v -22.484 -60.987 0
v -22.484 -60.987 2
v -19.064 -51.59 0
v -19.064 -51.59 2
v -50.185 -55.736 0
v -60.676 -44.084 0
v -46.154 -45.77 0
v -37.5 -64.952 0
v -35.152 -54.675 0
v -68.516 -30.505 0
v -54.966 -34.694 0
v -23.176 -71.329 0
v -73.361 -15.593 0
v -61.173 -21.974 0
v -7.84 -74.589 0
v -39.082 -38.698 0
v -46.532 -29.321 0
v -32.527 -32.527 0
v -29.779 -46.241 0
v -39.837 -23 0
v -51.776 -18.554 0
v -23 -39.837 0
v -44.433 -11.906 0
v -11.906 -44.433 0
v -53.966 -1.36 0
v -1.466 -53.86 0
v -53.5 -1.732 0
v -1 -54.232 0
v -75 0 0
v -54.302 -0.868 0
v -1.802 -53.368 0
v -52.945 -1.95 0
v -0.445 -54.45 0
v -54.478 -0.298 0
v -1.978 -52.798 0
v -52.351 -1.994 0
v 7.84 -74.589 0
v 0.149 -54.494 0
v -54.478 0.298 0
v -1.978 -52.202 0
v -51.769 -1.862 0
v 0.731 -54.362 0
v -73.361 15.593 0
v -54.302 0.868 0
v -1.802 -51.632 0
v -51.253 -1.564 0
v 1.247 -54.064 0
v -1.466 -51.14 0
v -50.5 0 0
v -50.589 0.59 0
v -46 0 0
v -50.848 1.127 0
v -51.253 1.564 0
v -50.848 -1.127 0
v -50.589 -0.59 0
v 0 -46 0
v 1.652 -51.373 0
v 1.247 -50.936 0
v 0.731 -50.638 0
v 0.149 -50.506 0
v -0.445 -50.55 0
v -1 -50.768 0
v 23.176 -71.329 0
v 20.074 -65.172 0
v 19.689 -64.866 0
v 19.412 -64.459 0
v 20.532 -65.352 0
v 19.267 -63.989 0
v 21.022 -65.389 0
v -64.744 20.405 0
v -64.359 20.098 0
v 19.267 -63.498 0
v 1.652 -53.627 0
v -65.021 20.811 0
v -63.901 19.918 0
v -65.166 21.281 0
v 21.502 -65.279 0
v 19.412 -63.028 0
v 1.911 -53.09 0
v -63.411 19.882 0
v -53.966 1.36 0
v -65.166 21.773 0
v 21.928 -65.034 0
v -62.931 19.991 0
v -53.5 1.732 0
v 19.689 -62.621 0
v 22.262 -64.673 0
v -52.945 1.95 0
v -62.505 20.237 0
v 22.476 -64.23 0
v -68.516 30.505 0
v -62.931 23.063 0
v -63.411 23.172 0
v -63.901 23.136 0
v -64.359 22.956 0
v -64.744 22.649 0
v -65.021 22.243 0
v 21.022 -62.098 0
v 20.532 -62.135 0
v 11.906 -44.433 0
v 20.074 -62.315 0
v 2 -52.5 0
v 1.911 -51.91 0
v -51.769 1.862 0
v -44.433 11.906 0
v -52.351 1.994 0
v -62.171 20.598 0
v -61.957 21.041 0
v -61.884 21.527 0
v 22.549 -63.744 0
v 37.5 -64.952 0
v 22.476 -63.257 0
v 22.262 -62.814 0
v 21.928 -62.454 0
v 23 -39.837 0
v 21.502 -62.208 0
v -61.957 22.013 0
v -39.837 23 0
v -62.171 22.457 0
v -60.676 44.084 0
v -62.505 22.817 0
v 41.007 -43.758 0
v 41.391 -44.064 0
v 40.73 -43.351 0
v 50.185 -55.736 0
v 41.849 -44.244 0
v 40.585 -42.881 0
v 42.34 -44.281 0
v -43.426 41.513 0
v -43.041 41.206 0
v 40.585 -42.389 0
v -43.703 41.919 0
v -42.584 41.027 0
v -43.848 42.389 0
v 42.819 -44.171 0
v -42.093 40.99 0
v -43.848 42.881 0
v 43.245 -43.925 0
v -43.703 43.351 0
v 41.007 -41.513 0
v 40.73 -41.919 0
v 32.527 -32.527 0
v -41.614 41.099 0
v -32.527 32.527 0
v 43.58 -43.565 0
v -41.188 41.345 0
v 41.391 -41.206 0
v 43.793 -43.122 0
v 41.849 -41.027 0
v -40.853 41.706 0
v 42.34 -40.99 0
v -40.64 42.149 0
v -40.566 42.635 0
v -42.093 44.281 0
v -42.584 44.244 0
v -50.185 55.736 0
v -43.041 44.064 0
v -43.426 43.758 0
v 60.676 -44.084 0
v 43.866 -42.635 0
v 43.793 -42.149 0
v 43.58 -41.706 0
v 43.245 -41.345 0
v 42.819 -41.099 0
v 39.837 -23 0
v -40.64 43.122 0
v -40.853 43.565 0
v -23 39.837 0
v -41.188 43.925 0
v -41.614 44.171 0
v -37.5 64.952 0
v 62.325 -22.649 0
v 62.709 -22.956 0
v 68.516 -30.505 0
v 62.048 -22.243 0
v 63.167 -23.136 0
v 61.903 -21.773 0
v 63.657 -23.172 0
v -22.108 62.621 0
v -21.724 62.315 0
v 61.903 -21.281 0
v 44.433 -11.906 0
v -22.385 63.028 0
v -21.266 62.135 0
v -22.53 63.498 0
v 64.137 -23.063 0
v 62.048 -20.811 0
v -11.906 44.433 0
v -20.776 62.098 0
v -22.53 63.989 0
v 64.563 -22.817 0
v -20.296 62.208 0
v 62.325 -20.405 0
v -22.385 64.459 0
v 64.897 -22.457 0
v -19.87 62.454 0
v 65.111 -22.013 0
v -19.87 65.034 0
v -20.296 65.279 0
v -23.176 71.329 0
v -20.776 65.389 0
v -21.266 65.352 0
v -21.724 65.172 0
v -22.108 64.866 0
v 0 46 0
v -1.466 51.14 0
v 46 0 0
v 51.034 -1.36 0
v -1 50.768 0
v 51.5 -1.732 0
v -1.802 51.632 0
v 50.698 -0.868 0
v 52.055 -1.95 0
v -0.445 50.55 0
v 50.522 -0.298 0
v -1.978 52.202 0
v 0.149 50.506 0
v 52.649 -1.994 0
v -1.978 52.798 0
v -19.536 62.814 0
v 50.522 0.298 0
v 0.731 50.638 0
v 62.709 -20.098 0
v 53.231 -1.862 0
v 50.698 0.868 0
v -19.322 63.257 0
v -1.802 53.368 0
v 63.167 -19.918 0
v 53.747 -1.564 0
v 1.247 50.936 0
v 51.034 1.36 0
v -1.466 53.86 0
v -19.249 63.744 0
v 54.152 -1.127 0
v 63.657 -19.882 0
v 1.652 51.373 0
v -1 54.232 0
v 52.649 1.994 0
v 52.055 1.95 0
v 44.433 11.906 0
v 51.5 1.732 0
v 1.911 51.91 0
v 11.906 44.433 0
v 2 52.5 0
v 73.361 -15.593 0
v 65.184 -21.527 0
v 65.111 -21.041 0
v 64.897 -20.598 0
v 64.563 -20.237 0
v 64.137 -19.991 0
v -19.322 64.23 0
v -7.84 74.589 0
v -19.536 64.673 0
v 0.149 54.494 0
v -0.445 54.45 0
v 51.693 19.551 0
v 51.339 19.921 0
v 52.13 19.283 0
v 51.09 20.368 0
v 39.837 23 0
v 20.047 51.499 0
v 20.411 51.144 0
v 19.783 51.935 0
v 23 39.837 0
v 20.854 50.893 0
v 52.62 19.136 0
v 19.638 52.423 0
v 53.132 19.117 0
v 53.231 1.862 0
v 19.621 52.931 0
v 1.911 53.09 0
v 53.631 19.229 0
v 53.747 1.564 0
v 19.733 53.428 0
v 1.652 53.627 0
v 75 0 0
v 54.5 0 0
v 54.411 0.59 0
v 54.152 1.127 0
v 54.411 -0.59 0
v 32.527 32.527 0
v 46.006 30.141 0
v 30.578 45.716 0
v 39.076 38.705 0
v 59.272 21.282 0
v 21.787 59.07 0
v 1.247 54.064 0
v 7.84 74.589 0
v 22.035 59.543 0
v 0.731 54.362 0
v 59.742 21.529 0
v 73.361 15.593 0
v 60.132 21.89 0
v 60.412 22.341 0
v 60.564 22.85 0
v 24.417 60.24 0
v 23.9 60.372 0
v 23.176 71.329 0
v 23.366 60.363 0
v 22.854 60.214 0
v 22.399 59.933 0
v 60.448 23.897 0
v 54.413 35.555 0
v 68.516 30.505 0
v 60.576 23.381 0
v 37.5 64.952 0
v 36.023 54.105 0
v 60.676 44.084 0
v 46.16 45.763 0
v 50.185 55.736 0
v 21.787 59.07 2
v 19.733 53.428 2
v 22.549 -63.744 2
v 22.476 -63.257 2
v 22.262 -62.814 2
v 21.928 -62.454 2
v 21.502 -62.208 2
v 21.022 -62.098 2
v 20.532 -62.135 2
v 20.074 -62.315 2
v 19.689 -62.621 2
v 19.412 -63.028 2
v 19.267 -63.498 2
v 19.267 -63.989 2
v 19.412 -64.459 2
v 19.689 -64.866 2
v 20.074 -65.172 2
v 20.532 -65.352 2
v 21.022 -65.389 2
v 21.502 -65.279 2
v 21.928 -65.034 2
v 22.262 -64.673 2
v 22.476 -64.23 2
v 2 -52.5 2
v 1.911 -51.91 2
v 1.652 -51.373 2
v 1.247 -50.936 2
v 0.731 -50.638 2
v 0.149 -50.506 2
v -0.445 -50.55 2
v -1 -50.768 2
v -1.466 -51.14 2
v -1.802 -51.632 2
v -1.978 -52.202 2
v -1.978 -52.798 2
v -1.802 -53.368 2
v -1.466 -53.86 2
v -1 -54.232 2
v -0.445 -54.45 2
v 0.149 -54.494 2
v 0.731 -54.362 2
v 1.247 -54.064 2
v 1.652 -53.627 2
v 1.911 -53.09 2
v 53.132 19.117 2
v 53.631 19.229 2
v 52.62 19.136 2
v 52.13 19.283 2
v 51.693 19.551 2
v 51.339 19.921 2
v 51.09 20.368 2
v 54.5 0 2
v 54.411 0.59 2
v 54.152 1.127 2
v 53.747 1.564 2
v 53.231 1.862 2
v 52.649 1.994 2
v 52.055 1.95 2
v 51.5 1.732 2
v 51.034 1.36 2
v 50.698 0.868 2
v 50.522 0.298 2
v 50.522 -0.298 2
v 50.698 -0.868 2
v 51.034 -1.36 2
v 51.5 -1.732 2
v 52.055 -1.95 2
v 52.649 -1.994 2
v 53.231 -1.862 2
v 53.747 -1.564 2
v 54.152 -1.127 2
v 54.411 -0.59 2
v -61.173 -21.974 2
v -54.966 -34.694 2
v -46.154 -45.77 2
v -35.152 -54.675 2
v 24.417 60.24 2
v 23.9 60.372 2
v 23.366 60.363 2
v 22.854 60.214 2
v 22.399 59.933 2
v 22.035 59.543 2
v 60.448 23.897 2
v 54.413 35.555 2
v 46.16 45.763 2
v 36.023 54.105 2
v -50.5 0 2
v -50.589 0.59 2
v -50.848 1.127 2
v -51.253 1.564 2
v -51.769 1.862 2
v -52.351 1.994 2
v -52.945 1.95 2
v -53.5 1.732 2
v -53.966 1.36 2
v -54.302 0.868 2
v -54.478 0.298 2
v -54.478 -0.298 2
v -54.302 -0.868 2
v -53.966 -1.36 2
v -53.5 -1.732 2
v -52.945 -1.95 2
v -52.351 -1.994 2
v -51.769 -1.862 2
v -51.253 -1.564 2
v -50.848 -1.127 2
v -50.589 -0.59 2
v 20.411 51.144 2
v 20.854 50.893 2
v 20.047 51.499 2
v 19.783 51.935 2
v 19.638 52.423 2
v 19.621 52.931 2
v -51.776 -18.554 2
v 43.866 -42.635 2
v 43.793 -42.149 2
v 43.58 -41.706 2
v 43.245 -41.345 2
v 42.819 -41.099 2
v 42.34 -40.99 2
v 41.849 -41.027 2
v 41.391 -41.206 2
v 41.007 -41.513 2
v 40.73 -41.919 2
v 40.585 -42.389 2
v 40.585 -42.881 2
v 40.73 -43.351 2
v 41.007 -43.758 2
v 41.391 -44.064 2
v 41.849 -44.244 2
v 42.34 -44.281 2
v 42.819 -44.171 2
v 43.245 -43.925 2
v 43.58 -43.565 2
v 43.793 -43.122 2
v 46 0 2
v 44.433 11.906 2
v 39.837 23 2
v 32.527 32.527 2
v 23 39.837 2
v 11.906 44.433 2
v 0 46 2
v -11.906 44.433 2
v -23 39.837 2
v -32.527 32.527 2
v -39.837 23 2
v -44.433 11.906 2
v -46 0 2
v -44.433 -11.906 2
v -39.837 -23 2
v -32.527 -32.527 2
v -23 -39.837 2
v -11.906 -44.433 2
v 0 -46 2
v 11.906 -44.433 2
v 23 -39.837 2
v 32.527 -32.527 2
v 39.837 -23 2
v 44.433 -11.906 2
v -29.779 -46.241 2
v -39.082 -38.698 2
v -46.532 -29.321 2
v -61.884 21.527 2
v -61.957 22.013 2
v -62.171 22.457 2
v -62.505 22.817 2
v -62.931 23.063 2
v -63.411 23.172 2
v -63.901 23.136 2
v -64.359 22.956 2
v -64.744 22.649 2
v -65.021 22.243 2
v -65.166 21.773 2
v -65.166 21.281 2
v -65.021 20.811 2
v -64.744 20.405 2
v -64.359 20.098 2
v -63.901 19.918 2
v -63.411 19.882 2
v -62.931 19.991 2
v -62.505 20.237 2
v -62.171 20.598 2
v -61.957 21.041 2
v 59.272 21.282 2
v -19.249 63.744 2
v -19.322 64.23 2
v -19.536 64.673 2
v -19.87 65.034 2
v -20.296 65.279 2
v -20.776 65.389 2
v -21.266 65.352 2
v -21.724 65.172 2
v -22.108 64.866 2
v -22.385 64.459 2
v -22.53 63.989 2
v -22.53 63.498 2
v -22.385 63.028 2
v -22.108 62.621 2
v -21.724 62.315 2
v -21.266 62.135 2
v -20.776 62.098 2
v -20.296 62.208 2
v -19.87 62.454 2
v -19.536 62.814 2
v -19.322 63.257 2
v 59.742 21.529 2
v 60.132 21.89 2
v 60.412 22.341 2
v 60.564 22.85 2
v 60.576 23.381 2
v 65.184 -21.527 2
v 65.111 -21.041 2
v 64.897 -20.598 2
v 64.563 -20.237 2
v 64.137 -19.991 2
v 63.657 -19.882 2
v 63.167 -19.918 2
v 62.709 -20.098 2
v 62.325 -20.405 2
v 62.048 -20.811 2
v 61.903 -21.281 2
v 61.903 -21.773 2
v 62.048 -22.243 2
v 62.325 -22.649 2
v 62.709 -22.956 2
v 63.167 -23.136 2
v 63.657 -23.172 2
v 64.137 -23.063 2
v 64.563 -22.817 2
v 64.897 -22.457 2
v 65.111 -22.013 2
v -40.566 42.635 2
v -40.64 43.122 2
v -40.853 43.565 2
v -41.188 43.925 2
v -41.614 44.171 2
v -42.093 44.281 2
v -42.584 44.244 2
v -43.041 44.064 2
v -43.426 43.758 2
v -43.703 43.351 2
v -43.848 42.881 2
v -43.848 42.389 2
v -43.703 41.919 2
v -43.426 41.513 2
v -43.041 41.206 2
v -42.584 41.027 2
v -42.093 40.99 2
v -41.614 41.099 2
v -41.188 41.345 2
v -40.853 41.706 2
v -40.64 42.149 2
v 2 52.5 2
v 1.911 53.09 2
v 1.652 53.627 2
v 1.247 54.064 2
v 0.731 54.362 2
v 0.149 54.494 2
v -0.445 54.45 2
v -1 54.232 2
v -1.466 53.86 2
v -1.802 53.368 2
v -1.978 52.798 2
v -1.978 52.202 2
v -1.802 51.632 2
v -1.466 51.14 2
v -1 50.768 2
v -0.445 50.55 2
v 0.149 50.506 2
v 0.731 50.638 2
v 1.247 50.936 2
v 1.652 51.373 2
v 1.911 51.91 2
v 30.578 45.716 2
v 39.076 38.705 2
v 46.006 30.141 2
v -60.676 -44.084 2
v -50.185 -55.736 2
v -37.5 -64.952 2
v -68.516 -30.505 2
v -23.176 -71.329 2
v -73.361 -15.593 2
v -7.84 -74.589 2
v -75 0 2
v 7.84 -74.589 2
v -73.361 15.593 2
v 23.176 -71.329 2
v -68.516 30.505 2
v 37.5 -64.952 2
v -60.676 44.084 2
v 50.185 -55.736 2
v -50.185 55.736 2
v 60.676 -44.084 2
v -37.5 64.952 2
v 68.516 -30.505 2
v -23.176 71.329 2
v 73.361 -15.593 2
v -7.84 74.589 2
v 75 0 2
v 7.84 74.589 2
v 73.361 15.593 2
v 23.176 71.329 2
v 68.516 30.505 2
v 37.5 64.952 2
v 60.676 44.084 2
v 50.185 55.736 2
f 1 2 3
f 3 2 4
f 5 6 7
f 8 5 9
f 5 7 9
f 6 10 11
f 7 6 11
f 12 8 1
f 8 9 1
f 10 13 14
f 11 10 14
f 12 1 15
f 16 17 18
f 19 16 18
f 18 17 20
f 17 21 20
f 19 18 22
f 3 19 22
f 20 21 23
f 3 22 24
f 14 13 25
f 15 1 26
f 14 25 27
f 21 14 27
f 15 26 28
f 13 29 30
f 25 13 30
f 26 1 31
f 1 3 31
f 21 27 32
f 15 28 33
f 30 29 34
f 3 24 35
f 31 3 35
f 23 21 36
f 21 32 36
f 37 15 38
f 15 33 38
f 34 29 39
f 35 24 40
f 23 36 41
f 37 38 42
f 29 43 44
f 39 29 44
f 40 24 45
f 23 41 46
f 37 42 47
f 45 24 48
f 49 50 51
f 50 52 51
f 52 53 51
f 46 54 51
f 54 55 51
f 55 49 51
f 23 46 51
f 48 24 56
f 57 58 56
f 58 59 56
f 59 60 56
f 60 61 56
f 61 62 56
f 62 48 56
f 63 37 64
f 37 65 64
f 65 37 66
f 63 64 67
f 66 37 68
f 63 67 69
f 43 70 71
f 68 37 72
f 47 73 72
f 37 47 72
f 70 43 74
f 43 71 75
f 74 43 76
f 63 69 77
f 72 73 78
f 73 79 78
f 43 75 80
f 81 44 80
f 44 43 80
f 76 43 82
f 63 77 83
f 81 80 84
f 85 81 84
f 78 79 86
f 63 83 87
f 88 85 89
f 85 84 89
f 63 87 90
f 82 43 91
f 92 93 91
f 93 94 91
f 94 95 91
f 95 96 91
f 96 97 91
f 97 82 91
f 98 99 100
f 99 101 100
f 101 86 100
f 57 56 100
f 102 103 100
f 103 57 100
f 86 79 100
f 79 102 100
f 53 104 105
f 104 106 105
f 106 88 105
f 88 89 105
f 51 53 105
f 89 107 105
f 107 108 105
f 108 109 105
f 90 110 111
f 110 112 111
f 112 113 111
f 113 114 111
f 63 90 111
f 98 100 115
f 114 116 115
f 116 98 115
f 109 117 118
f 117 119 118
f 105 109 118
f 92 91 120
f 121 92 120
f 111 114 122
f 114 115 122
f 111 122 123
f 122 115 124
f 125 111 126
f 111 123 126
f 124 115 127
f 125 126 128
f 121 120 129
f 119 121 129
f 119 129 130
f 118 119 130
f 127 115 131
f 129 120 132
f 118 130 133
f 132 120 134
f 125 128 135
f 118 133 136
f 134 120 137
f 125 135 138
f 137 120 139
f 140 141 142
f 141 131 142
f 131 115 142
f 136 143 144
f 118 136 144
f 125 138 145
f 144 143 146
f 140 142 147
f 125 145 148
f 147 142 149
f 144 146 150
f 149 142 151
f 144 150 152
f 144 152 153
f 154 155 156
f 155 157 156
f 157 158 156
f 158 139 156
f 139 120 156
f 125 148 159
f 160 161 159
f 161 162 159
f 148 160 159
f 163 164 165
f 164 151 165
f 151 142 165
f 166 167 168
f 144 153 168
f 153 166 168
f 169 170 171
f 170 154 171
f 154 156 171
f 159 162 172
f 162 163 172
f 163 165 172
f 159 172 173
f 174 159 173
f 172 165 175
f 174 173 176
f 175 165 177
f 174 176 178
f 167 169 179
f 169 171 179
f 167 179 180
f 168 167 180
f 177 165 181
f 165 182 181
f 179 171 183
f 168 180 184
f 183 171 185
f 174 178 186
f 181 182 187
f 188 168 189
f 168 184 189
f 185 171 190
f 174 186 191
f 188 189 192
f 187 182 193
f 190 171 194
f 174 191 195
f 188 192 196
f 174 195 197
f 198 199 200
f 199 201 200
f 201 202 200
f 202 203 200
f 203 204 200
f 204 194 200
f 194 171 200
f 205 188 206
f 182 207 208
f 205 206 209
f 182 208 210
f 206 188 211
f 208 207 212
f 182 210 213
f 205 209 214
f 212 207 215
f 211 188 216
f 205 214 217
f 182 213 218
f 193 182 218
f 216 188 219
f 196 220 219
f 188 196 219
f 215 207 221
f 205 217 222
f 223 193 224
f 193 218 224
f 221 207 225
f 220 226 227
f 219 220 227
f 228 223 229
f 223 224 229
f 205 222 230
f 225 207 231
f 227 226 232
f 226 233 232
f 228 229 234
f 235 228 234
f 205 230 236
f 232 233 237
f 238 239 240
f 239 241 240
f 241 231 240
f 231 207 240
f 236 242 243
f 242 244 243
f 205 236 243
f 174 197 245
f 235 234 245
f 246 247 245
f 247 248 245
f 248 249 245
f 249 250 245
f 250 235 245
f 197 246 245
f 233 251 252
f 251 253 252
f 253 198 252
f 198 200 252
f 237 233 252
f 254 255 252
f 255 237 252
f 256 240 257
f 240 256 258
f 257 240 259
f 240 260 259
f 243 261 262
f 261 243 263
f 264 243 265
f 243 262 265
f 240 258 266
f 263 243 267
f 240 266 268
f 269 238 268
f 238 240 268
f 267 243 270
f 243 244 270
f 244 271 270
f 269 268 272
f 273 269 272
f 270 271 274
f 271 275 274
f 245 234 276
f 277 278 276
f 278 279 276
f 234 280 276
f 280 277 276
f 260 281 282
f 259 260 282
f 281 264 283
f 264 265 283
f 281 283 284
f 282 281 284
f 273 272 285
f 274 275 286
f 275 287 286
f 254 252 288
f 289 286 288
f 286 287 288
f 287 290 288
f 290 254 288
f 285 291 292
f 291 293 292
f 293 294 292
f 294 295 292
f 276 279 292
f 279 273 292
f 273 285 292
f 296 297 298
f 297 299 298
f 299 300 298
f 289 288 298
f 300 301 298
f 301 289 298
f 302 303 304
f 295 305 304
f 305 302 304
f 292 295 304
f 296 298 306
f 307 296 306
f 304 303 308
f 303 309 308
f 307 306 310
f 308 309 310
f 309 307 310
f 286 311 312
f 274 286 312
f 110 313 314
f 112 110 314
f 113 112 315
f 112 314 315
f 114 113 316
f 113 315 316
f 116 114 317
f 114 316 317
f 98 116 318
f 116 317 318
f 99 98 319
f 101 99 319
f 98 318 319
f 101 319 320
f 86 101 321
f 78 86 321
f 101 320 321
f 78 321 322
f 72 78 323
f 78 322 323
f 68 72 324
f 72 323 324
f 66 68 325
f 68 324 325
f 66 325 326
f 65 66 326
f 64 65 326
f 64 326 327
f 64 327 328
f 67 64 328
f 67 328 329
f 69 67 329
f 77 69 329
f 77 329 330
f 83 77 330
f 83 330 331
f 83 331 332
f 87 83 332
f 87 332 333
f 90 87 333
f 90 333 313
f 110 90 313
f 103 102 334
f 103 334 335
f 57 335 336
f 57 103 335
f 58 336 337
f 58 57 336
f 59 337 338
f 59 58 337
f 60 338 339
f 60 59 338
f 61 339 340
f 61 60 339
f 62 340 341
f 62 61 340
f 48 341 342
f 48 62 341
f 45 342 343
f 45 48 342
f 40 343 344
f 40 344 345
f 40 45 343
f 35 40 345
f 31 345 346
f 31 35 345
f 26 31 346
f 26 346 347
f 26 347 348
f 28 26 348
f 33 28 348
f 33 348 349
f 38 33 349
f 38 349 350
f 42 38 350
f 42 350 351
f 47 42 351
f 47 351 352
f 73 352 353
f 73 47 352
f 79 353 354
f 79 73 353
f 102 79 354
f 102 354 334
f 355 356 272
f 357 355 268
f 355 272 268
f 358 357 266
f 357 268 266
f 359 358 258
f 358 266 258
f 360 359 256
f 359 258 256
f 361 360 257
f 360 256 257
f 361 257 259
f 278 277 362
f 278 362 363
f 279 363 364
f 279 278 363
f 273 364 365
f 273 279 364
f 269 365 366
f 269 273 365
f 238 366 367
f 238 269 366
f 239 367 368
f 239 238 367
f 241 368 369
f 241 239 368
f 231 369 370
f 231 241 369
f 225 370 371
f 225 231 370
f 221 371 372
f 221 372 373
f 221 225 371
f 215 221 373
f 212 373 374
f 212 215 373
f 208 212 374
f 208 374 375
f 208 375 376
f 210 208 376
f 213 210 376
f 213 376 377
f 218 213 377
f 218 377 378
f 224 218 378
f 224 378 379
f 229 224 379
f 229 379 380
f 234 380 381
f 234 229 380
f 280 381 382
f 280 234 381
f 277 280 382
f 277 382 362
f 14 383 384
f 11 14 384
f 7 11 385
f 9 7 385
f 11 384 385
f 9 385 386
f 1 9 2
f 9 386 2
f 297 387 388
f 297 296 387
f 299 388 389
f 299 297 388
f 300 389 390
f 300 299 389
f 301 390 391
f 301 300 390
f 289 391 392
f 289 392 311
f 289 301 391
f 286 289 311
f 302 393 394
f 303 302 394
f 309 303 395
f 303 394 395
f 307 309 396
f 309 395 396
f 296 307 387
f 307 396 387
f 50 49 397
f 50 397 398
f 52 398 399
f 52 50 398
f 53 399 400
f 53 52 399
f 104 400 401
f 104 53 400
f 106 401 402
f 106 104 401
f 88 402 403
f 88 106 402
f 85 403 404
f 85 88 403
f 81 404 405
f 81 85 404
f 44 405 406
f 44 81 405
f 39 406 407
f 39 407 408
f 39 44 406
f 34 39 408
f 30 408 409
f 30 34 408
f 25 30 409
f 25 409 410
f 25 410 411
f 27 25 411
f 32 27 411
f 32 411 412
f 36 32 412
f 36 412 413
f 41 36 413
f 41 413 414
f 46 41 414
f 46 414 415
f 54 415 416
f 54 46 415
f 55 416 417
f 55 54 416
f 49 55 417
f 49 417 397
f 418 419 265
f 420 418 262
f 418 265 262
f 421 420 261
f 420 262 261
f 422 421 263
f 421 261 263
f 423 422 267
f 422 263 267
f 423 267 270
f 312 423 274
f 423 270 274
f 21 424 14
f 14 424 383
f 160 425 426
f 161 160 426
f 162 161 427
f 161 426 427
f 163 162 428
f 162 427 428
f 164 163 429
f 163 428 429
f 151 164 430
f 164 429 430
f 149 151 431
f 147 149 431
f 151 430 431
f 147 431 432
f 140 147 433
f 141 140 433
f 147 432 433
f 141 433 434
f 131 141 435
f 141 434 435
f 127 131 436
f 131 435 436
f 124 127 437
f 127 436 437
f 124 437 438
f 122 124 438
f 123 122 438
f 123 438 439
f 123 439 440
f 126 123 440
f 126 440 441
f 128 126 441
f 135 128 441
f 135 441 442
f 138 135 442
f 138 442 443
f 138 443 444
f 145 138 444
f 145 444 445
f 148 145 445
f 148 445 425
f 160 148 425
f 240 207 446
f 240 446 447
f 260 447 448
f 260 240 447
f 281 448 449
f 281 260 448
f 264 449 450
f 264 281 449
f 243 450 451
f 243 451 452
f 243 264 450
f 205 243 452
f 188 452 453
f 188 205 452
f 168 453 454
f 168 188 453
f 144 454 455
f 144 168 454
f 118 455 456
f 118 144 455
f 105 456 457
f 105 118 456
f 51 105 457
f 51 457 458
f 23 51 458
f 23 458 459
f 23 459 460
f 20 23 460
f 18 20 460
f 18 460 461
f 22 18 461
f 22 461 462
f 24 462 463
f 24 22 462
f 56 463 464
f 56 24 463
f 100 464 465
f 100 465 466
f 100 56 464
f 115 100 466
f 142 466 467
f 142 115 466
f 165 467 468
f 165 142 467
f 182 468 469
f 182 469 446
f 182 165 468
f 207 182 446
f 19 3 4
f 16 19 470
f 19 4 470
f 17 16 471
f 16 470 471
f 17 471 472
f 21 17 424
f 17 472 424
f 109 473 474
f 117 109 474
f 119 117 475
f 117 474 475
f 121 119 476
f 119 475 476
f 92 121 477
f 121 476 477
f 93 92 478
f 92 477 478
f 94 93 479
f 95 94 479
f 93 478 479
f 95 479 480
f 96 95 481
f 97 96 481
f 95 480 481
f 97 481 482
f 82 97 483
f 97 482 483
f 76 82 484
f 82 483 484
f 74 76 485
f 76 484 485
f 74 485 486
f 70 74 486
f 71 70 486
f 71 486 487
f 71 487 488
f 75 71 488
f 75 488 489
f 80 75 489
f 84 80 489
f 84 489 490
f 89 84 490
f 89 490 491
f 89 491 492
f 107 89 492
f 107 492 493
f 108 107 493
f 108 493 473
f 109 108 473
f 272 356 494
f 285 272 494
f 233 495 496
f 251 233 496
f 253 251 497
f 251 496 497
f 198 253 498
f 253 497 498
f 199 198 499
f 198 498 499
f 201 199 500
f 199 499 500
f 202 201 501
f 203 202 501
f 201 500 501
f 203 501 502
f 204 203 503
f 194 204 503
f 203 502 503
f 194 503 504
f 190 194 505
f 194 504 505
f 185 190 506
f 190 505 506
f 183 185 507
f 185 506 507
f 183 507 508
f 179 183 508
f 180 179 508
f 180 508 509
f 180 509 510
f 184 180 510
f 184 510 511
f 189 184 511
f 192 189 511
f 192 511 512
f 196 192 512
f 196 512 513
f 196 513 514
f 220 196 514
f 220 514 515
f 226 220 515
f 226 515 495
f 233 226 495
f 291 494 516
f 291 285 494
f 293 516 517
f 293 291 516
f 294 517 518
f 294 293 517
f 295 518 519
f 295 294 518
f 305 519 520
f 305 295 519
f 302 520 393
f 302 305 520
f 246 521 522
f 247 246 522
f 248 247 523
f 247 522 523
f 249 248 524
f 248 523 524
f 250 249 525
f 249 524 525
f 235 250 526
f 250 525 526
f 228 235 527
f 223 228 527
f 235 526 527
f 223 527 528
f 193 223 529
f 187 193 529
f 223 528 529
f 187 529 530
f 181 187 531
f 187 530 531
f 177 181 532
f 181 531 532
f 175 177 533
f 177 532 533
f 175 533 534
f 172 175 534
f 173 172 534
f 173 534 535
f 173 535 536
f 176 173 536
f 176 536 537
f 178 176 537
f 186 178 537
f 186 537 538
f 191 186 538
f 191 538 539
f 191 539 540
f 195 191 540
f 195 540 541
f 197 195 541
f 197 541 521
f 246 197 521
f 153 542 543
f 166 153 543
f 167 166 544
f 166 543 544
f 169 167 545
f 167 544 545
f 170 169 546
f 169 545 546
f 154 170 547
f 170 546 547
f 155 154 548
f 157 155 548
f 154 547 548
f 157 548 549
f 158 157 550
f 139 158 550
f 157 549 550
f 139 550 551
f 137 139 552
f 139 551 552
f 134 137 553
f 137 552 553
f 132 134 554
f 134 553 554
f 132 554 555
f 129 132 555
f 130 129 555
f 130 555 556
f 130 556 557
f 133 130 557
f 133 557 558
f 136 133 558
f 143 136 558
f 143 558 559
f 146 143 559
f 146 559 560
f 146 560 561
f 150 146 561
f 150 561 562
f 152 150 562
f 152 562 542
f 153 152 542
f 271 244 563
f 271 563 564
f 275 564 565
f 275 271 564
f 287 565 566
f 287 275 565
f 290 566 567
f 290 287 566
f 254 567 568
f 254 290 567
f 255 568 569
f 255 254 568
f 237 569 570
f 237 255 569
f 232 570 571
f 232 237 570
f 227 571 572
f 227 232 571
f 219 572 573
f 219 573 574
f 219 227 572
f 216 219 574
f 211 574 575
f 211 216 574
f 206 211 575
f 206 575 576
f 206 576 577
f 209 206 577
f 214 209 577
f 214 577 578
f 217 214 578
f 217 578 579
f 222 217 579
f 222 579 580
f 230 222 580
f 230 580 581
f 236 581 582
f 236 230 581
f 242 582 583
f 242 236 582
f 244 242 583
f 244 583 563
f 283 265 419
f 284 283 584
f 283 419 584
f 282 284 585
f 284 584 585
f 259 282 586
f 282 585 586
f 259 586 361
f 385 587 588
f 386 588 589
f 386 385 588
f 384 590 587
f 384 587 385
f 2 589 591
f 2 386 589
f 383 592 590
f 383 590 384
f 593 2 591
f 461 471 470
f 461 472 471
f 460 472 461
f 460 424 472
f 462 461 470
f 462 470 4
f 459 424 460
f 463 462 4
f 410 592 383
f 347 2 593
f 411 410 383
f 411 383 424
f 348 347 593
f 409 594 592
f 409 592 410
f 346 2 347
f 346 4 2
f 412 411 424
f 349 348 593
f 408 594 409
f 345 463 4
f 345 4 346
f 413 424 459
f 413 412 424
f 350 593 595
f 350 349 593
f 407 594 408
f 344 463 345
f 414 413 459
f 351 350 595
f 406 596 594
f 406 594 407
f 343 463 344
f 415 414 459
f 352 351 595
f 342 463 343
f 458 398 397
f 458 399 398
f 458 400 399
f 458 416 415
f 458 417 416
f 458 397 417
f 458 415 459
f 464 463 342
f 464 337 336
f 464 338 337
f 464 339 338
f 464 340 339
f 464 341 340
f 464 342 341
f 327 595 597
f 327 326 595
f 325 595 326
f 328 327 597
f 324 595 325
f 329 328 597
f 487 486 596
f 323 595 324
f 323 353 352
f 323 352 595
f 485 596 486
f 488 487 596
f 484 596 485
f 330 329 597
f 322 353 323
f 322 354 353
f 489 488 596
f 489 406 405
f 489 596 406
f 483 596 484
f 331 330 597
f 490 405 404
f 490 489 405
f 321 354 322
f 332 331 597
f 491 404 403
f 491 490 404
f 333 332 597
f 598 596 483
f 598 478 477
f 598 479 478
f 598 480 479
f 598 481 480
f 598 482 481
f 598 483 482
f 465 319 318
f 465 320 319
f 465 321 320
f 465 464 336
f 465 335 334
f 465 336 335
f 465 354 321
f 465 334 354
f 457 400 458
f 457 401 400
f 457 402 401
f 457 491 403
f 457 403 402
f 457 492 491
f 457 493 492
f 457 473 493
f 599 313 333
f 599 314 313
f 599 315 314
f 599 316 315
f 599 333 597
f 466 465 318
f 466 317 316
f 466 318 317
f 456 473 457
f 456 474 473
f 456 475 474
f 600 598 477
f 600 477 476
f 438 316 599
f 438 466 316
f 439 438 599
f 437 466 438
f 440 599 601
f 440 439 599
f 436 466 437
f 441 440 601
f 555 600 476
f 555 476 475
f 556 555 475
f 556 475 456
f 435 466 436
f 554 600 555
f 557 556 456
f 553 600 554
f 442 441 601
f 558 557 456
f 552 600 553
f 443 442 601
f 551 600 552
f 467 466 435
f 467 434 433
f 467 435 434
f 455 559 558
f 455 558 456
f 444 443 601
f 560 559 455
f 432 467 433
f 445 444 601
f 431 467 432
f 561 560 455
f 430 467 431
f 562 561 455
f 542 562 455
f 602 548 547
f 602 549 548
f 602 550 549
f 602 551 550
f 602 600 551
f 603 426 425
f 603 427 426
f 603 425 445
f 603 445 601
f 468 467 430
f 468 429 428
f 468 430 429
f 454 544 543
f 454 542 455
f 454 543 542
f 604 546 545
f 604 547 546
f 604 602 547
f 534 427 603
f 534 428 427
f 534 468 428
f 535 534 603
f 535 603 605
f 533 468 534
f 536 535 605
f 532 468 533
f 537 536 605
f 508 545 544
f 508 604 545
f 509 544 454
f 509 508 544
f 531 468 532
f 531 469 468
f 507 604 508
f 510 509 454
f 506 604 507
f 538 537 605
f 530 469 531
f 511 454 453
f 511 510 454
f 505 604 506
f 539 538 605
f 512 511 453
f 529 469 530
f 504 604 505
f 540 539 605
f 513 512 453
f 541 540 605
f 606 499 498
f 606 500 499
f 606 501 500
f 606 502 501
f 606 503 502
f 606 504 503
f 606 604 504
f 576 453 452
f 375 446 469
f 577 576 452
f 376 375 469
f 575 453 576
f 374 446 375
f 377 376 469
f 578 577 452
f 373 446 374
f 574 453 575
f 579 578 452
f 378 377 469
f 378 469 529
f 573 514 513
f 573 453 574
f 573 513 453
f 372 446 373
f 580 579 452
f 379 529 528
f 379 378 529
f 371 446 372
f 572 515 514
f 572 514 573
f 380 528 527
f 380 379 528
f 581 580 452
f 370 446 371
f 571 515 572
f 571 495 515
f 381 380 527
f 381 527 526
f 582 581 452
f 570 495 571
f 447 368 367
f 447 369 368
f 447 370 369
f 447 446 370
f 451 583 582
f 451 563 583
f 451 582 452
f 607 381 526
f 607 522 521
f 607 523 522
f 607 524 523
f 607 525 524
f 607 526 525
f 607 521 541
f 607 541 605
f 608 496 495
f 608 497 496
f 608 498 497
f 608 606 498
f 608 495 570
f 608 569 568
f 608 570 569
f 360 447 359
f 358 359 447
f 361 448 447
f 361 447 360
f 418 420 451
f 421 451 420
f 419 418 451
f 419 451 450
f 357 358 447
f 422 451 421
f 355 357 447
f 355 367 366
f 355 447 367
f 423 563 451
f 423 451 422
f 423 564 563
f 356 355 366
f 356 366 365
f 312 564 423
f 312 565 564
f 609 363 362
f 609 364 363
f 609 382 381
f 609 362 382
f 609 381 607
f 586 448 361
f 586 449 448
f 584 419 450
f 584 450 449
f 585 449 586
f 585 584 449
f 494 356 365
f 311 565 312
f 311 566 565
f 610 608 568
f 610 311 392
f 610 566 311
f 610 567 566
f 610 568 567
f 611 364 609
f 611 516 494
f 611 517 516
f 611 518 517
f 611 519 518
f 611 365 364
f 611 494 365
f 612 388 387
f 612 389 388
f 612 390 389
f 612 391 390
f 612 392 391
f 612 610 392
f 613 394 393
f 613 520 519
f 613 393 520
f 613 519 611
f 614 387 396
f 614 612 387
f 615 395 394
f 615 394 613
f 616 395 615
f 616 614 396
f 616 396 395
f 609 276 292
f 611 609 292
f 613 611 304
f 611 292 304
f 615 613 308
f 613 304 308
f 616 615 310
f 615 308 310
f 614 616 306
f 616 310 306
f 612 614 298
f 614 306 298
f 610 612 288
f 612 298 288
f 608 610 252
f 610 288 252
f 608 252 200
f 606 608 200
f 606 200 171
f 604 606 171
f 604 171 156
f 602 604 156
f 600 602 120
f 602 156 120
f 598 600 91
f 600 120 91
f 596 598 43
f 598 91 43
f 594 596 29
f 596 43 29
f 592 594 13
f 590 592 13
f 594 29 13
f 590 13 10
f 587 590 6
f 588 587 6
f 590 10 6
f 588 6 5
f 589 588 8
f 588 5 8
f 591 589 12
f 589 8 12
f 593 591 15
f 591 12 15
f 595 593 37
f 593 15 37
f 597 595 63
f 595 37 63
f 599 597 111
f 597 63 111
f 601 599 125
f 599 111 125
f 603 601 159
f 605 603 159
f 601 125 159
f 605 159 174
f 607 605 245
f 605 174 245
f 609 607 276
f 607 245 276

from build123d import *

# Parameters (mm, degrees)
SKETCH_1_R          = 75
SKETCH_1_R_2        = 2
SKETCH_1_R_3        = 46
EXTRUDE_1_DEPTH     = 2
CUT_EXTRUDE_2_DEPTH = 10
SKETCH_5_R          = 1.65
CUT_EXTRUDE_3_DEPTH = 10
FILLET_2_R          = 2


with BuildPart() as part:
    # 草图1 → 凸台-拉伸1 (new body)
    with BuildSketch(Plane.XY):
        Circle(SKETCH_1_R)
        with Locations((-52.5, 0)):
            Circle(SKETCH_1_R_2, mode=Mode.SUBTRACT)
        with Locations((0, 52.5)):
            Circle(SKETCH_1_R_2, mode=Mode.SUBTRACT)
        with Locations((52.5, 0)):
            Circle(SKETCH_1_R_2, mode=Mode.SUBTRACT)
        with Locations((0, -52.5)):
            Circle(SKETCH_1_R_2, mode=Mode.SUBTRACT)
        Circle(SKETCH_1_R_3, mode=Mode.SUBTRACT)
    extrude(amount=EXTRUDE_1_DEPTH)

    # 草图3 → 切除-拉伸2 (cut)
    with BuildSketch(Plane.XY.offset(2)):
        with BuildLine():
            Line((-51.775970298, -18.553945664), (-61.172994758, -21.974182859))
            ThreePointArc((-61.172994758, -21.974182859), (-46.153503513, -45.769576287), (-22.484399296, -60.98730842))
            Line((-22.484399296, -60.98730842), (-19.064163111, -51.59028673))
            ThreePointArc((-19.064163111, -51.59028673), (-39.082362813, -38.698435587), (-51.775970298, -18.553945664))
        make_face()
        with BuildLine():
            Line((51.775970298, 18.553945664), (61.172994758, 21.974182859))
            ThreePointArc((61.172994758, 21.974182859), (46.153503513, 45.769576287), (22.484399296, 60.98730842))
            Line((22.484399296, 60.98730842), (19.064163111, 51.59028673))
            ThreePointArc((19.064163111, 51.59028673), (39.082362813, 38.698435587), (51.775970298, 18.553945664))
        make_face()
    extrude(amount=-CUT_EXTRUDE_2_DEPTH, mode=Mode.SUBTRACT)

    # 草图5 → 切除-拉伸3 (cut)
    with BuildSketch(Plane.XY.offset(2)):
        with Locations((-63.53412763, 21.527067294)):
            Circle(SKETCH_5_R)
        with Locations((-42.216475186, 42.635304887)):
            Circle(SKETCH_5_R)
        with Locations((-20.898822743, 63.743542481)):
            Circle(SKETCH_5_R)
        with Locations((63.53412763, -21.527067294)):
            Circle(SKETCH_5_R)
        with Locations((42.216475186, -42.635304887)):
            Circle(SKETCH_5_R)
        with Locations((20.898822743, -63.743542481)):
            Circle(SKETCH_5_R)
    extrude(amount=-CUT_EXTRUDE_3_DEPTH, mode=Mode.SUBTRACT)

    # 圆角2
    fillet_2_edges = [part.edges().sort_by_distance(p)[0] for p in [
        (51.775970298, 18.553945664, 1),
        (19.064163111, 51.59028673, 1),
        (22.484399296, 60.98730842, 1),
        (61.172994758, 21.974182859, 1),
    ]]
    fillet(fillet_2_edges, radius=FILLET_2_R)


solid = part.part
